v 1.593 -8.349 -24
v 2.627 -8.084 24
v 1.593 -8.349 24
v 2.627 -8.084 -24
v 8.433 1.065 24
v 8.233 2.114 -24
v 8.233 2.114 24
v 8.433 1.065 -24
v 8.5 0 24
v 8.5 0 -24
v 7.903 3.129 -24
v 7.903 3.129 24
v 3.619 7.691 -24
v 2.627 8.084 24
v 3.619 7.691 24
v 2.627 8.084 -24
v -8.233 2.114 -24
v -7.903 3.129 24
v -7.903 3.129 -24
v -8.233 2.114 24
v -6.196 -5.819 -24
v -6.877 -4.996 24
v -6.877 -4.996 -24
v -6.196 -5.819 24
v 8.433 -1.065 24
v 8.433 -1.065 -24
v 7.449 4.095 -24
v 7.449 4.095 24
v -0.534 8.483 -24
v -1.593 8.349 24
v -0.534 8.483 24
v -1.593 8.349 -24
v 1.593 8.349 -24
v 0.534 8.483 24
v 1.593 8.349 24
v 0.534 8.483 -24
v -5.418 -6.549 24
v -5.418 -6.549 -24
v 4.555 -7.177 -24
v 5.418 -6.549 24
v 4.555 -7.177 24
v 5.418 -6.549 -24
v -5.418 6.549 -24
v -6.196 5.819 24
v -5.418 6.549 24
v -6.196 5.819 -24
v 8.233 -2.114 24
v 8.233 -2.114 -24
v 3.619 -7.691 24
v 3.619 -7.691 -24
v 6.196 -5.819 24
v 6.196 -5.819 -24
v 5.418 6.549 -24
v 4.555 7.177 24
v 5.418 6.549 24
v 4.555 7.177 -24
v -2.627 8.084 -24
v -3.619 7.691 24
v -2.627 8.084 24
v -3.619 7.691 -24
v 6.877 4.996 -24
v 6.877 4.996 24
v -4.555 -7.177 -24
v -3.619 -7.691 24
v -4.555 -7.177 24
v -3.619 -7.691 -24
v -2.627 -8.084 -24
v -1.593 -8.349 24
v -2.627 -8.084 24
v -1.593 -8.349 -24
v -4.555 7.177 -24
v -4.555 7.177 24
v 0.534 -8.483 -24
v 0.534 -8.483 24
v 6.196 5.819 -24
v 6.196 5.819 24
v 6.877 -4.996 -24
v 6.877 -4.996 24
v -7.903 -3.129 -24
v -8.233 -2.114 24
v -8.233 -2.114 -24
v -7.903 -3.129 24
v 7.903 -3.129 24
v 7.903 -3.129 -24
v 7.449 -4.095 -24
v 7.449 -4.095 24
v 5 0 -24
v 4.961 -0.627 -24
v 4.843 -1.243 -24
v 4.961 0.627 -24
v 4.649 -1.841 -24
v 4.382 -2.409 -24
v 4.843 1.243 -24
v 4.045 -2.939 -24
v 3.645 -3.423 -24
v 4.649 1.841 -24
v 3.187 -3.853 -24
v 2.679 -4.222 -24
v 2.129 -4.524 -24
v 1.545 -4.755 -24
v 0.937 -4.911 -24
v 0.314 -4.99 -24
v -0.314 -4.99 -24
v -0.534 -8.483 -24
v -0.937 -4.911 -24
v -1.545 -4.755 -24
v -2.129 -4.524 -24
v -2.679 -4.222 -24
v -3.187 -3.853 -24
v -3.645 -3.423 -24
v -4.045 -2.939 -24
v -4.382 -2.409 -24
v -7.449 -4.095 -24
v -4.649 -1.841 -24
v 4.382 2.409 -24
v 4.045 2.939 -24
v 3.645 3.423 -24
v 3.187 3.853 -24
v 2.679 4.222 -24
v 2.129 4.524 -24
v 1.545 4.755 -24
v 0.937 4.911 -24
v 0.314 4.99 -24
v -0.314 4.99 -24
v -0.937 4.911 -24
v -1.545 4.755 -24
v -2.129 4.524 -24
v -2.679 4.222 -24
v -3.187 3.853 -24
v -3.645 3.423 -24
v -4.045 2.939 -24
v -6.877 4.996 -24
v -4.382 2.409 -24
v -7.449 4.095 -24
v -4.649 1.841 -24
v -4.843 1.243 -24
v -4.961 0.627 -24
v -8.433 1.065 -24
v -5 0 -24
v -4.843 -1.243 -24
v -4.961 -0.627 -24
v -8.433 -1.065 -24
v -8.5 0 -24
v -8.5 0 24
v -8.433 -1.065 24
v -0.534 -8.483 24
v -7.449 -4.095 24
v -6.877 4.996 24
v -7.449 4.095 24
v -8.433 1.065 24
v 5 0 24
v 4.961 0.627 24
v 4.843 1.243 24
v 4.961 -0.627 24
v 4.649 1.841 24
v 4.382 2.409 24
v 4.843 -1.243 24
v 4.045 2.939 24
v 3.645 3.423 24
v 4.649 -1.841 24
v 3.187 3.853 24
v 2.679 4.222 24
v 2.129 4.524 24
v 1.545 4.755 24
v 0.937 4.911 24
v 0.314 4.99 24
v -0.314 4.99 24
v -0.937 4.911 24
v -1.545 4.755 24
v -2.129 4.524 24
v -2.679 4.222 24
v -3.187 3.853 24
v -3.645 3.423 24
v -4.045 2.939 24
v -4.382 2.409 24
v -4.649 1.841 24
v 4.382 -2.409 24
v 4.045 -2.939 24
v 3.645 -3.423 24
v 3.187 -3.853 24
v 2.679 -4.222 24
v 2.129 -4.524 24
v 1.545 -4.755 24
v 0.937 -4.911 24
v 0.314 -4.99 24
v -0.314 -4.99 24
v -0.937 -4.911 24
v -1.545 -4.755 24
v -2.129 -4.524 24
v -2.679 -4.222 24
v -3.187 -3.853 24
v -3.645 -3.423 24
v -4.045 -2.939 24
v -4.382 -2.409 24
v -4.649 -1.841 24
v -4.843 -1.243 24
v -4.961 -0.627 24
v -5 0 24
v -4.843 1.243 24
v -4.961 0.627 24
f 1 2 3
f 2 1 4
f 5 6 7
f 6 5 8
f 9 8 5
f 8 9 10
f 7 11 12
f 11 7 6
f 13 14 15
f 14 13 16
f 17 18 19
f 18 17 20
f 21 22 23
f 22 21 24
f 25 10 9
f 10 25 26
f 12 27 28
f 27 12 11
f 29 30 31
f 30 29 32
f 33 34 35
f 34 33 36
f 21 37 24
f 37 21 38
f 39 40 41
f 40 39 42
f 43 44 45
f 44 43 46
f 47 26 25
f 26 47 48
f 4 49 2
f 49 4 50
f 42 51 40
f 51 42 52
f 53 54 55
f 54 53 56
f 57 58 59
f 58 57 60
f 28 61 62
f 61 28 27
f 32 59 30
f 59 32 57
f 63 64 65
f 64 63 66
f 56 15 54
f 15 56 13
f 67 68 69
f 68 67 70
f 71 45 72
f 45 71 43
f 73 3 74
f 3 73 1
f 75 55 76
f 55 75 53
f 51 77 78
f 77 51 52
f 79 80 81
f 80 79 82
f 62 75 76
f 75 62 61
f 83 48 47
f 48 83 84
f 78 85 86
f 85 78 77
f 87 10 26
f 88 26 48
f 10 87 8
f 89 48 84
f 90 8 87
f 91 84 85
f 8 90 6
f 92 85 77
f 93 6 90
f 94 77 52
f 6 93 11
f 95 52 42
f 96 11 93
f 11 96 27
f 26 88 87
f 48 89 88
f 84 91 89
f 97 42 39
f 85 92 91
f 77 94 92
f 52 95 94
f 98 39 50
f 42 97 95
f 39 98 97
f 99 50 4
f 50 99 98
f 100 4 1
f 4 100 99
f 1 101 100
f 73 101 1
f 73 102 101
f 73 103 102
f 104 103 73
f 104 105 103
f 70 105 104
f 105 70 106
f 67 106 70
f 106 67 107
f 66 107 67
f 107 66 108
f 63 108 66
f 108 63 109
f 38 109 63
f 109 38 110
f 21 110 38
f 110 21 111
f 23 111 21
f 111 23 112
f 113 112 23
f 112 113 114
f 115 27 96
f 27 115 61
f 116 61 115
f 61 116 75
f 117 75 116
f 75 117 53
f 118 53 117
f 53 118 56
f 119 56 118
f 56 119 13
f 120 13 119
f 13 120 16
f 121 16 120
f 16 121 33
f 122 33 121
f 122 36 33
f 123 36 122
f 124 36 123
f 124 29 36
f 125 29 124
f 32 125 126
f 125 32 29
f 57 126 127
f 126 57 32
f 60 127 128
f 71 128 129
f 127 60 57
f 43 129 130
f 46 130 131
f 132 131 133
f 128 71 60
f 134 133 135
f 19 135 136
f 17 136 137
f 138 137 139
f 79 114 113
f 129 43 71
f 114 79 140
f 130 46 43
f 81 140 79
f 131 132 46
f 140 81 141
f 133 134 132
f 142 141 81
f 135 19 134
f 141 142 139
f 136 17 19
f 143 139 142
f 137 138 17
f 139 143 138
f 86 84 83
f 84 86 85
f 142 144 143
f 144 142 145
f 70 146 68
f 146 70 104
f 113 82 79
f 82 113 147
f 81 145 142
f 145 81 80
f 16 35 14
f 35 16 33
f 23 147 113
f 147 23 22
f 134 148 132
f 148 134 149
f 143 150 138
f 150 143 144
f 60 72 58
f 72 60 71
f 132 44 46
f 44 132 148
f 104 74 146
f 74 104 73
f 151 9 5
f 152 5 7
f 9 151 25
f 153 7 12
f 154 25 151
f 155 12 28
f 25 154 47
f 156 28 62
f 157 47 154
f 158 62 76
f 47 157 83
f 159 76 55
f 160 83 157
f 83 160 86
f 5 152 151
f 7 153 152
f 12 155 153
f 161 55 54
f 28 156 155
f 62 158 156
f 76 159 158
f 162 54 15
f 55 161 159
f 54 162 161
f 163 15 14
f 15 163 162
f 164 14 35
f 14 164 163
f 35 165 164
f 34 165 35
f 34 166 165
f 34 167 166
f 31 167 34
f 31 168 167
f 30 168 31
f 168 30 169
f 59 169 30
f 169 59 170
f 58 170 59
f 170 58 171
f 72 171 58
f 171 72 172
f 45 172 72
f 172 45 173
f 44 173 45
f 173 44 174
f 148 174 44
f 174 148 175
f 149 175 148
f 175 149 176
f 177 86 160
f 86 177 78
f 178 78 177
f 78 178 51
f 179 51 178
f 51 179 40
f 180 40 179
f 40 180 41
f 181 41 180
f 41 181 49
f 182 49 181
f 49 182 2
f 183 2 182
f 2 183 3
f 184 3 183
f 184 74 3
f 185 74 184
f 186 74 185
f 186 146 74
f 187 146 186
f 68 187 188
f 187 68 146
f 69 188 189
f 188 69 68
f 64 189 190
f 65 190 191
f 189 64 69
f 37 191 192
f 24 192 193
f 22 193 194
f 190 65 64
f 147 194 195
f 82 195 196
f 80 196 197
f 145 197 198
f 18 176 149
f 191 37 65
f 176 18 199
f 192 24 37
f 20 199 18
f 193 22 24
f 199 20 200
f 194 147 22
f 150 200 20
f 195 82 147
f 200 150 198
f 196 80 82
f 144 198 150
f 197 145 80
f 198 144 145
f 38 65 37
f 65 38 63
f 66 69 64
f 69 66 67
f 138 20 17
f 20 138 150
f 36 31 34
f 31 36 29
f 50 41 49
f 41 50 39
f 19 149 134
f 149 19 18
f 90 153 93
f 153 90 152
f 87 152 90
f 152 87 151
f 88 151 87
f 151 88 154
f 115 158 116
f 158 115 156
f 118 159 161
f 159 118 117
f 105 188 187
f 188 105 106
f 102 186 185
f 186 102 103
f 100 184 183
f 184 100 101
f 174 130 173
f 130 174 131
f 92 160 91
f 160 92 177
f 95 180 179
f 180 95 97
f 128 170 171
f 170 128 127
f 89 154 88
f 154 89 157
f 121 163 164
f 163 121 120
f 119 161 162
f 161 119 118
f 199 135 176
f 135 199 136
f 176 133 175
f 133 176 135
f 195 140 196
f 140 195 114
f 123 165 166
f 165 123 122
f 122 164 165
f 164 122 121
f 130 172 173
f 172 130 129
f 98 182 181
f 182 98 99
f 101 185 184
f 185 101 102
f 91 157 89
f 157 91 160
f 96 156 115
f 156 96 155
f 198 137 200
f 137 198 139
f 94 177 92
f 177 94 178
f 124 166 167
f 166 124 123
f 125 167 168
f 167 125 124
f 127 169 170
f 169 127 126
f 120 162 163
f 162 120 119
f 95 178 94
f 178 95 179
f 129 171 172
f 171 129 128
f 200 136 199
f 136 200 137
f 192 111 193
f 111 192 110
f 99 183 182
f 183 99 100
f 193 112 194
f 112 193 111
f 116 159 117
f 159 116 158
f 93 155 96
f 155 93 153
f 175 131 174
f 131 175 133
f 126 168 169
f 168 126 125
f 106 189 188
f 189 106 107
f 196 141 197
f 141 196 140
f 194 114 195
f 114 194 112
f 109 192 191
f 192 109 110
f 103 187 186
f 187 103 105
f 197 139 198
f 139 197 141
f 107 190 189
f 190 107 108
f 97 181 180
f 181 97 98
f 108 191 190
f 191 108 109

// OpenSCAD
$fn = 50;


difference() {
	union() {
		translate(v = [0, 0, -24.0000000000]) {
			cylinder(h = 48, r = 8.5000000000);
		}
	}
	union() {
		translate(v = [0, 0, -100.0000000000]) {
			cylinder(h = 200, r = 5.0000000000);
		}
	}
}
